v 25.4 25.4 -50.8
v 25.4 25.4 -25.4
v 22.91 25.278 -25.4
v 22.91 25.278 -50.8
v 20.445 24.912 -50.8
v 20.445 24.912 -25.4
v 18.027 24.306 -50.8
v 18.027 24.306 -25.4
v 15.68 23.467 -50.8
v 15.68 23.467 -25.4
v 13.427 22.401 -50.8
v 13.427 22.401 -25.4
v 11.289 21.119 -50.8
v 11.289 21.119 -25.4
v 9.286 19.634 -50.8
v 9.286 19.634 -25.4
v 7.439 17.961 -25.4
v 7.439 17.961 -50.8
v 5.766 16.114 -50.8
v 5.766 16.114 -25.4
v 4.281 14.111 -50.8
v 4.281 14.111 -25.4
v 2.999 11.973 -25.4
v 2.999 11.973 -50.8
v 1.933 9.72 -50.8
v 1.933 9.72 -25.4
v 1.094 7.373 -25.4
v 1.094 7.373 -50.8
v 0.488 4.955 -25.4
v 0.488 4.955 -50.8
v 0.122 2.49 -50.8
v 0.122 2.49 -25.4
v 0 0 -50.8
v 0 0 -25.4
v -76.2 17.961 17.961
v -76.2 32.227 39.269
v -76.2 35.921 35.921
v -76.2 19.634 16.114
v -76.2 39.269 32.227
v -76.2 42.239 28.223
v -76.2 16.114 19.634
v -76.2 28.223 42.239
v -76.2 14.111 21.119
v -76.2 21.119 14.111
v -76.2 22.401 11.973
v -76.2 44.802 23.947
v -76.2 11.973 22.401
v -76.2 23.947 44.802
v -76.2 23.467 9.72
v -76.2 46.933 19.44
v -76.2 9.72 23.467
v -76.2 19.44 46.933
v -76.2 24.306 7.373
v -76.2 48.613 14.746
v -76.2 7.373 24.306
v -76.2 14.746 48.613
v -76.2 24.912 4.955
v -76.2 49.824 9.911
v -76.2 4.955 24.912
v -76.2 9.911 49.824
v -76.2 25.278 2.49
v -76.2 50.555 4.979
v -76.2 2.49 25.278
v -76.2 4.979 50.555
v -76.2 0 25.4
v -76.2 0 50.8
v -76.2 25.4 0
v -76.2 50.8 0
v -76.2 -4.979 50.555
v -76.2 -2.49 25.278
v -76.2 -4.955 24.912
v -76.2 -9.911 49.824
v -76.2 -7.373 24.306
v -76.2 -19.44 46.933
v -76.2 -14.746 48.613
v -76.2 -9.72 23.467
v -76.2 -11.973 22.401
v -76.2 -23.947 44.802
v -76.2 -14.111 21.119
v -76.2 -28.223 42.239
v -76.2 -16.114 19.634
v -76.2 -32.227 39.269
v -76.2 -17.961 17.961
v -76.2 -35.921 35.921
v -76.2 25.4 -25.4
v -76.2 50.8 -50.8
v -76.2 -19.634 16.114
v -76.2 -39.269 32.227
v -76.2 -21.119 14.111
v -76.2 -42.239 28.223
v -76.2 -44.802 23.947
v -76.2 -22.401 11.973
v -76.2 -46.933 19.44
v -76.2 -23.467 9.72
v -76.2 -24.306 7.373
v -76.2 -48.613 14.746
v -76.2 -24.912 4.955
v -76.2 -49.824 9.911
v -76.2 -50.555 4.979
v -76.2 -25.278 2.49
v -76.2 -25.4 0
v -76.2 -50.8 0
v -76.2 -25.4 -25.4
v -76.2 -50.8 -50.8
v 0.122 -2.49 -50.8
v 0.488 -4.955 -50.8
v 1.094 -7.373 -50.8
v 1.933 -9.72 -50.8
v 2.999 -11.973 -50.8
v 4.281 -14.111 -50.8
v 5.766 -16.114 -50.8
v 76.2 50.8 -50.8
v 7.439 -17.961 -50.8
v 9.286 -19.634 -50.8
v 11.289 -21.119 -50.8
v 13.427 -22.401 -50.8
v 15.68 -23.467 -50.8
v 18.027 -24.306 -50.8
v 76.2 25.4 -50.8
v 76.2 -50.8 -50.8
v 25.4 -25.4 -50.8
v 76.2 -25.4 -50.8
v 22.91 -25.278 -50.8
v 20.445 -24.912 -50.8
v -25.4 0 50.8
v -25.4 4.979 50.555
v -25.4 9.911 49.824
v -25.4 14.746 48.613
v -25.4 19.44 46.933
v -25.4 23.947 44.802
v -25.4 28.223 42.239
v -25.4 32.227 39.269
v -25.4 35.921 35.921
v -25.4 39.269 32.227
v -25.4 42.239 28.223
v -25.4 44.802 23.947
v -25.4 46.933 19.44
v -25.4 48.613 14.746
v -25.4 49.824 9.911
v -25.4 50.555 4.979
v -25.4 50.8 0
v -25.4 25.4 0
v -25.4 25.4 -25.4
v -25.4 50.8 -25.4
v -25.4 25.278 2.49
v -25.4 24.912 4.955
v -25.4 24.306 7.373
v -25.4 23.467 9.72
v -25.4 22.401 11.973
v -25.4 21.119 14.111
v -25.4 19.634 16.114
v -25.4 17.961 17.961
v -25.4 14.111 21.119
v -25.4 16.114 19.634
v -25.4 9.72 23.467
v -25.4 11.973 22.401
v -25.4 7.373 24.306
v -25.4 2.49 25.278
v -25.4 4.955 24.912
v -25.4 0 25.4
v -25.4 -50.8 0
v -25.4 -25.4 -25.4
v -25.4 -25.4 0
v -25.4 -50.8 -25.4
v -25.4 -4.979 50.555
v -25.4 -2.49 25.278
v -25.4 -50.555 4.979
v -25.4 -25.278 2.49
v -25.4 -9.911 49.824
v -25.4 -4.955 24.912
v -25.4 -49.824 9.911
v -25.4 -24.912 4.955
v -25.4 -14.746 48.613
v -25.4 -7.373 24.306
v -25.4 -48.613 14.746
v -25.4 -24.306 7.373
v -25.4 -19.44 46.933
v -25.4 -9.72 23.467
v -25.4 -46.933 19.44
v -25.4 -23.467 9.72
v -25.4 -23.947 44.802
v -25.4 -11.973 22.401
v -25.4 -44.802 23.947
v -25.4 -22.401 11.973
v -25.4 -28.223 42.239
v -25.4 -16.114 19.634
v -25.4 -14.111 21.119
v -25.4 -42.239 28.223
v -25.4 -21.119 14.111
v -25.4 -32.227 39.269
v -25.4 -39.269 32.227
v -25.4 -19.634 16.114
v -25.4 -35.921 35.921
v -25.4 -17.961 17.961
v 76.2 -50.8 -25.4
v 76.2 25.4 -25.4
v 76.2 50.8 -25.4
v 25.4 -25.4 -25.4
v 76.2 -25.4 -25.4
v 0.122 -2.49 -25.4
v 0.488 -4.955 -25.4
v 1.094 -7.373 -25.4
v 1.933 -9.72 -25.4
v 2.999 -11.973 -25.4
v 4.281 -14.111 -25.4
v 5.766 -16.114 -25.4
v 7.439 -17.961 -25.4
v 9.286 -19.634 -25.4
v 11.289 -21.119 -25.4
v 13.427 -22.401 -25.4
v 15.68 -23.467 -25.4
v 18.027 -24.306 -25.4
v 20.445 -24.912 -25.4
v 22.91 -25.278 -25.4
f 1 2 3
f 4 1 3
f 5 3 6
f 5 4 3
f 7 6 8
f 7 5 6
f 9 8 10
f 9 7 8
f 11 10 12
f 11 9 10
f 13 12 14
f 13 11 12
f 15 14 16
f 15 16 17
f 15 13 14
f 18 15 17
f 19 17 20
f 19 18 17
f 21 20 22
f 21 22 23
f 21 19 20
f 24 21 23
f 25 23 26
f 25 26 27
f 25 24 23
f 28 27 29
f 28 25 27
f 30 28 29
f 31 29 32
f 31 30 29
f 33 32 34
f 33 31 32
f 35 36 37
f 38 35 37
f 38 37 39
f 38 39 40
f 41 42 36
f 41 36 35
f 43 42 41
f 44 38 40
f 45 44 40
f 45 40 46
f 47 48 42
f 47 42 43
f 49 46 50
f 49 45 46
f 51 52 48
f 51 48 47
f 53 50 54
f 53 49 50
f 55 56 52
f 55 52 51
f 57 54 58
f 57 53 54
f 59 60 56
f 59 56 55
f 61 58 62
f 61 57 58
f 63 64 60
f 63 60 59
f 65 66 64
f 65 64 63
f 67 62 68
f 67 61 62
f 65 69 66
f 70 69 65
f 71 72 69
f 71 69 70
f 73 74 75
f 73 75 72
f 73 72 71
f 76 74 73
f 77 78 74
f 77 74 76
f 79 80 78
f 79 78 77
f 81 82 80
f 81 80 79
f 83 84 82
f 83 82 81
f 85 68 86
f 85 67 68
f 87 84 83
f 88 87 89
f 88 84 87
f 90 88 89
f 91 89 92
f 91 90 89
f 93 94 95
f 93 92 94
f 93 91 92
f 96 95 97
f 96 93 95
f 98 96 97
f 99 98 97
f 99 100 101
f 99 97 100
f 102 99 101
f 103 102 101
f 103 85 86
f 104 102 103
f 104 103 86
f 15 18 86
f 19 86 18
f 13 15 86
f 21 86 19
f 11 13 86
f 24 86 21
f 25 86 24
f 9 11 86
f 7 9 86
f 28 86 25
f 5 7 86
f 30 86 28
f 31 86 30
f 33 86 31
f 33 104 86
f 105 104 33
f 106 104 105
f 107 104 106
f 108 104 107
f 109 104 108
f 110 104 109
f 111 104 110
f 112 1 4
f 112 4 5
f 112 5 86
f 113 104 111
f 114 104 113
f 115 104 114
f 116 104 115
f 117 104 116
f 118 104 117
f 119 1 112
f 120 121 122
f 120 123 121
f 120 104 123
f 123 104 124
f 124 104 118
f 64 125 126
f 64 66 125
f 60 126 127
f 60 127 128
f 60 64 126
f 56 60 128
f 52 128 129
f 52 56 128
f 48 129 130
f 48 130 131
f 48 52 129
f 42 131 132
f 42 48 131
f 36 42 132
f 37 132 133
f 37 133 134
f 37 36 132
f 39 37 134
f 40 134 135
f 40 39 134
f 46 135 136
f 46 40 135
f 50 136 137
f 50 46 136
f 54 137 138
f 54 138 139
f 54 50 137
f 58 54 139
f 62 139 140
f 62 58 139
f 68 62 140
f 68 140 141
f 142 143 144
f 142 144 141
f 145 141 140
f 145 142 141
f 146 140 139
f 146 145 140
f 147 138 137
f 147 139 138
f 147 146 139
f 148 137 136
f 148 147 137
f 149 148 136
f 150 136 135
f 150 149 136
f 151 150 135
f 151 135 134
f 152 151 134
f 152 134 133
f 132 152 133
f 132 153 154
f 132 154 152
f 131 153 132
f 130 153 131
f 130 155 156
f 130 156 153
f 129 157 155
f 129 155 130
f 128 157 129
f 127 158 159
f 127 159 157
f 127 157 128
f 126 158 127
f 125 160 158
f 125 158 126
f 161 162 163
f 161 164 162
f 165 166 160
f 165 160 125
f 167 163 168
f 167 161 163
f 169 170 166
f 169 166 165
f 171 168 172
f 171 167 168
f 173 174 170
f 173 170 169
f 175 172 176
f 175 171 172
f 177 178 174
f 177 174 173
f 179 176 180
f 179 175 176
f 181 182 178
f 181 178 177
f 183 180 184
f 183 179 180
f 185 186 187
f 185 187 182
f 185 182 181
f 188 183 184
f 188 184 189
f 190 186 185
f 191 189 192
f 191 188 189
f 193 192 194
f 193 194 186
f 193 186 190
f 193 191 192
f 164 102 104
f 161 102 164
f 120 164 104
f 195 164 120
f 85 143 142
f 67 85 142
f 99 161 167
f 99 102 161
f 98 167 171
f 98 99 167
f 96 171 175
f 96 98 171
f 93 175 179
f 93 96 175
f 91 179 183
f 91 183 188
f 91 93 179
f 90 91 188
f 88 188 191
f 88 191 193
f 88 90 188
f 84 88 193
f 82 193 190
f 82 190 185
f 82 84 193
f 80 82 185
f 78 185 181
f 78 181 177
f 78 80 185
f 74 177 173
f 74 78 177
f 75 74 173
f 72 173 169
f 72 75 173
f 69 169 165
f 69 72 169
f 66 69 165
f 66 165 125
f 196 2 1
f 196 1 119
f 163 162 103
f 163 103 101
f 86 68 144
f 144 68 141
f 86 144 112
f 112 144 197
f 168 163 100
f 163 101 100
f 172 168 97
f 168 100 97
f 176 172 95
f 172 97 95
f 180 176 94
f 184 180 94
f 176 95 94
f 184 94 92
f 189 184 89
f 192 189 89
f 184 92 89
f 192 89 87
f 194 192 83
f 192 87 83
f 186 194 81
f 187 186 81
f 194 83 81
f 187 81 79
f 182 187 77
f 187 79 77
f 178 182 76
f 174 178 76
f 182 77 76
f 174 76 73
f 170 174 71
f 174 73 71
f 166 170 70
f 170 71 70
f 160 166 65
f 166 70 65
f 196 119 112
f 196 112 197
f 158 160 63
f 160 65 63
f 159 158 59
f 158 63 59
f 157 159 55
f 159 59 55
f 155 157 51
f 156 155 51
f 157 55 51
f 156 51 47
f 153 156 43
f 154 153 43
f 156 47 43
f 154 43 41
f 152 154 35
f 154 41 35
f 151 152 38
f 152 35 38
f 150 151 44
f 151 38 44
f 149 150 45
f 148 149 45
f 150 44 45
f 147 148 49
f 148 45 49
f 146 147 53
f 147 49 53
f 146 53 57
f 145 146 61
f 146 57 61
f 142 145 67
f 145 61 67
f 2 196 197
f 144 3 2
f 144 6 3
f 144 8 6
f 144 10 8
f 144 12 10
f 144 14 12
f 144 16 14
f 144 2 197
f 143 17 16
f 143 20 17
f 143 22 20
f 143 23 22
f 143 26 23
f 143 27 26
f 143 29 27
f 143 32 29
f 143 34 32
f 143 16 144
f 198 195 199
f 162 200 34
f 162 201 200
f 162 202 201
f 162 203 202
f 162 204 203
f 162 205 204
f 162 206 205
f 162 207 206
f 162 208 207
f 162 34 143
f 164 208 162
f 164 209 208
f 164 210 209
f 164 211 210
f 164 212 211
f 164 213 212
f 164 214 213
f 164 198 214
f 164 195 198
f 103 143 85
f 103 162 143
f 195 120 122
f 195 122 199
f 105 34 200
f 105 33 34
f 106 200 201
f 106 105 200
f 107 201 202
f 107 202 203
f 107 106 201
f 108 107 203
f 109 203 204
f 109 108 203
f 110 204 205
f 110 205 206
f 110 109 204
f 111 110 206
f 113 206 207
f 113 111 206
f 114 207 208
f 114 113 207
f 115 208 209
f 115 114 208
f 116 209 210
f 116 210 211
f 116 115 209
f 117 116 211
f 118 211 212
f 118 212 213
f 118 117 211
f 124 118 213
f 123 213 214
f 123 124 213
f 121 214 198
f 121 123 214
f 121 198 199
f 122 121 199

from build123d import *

# Parameters (mm, degrees)
F1_DEPTH = 50.8
F2_W     = 50.8
F2_H     = 50.8
F3_DEPTH = 204.4911384583
F4_W     = 76.2
F4_H     = 50.8
F5_DEPTH = 61.3817144185
F6_R     = 50.79999
F7_R     = 25.39999
F8_R     = 25.39999


# Not quite as in the source:
# - a fillet or chamfer is up to 0.001 mm smaller than in the source, because OpenCascade refuses the exact size


with BuildPart() as f1:
    # F0 (on Front) → F1 (new body, symmetric)
    with BuildSketch(Plane.XZ):
        Polygon((-25.4, -25.4), (-25.4, 50.8), (-76.2, 50.8), (-76.2, -50.8), (76.2, -50.8), (76.2, -25.4), align=None)
    extrude(amount=F1_DEPTH, both=True)

    # F2 (on face) → F3 (cut)
    with BuildSketch(Plane.YZ.offset(-25.4)):
        Rectangle(F2_W, F2_H)
    extrude(amount=-F3_DEPTH, mode=Mode.SUBTRACT)

    # F4 (on face) → F5 (cut)
    with BuildSketch(Plane.XY.offset(-25.4)):
        with Locations((38.1, 0)):
            Rectangle(F4_W, F4_H)
    extrude(amount=-F5_DEPTH, mode=Mode.SUBTRACT)

    # F6 (radius 50.8 in the source; OpenCascade refuses exactly that, so slightly less here)
    f6_edges = [f1.edges().sort_by_distance(p)[0] for p in [
        (-50.8, -50.8, 50.8),
        (-50.8, 50.8, 50.8),
    ]]
    fillet(f6_edges, radius=F6_R)

    # F7 (radius 25.4 in the source; OpenCascade refuses exactly that, so slightly less here)
    f7_edges = [f1.edges().sort_by_distance(p)[0] for p in [
        (-50.8, -25.4, 25.4),
        (-50.8, 25.4, 25.4),
    ]]
    fillet(f7_edges, radius=F7_R)

    # F8 (radius 25.4 in the source; OpenCascade refuses exactly that, so slightly less here)
    f8_edges = [f1.edges().sort_by_distance(p)[0] for p in [
        (0, -25.4, -38.1),
        (0, 25.4, -38.1),
    ]]
    fillet(f8_edges, radius=F8_R)


solid = f1.part
